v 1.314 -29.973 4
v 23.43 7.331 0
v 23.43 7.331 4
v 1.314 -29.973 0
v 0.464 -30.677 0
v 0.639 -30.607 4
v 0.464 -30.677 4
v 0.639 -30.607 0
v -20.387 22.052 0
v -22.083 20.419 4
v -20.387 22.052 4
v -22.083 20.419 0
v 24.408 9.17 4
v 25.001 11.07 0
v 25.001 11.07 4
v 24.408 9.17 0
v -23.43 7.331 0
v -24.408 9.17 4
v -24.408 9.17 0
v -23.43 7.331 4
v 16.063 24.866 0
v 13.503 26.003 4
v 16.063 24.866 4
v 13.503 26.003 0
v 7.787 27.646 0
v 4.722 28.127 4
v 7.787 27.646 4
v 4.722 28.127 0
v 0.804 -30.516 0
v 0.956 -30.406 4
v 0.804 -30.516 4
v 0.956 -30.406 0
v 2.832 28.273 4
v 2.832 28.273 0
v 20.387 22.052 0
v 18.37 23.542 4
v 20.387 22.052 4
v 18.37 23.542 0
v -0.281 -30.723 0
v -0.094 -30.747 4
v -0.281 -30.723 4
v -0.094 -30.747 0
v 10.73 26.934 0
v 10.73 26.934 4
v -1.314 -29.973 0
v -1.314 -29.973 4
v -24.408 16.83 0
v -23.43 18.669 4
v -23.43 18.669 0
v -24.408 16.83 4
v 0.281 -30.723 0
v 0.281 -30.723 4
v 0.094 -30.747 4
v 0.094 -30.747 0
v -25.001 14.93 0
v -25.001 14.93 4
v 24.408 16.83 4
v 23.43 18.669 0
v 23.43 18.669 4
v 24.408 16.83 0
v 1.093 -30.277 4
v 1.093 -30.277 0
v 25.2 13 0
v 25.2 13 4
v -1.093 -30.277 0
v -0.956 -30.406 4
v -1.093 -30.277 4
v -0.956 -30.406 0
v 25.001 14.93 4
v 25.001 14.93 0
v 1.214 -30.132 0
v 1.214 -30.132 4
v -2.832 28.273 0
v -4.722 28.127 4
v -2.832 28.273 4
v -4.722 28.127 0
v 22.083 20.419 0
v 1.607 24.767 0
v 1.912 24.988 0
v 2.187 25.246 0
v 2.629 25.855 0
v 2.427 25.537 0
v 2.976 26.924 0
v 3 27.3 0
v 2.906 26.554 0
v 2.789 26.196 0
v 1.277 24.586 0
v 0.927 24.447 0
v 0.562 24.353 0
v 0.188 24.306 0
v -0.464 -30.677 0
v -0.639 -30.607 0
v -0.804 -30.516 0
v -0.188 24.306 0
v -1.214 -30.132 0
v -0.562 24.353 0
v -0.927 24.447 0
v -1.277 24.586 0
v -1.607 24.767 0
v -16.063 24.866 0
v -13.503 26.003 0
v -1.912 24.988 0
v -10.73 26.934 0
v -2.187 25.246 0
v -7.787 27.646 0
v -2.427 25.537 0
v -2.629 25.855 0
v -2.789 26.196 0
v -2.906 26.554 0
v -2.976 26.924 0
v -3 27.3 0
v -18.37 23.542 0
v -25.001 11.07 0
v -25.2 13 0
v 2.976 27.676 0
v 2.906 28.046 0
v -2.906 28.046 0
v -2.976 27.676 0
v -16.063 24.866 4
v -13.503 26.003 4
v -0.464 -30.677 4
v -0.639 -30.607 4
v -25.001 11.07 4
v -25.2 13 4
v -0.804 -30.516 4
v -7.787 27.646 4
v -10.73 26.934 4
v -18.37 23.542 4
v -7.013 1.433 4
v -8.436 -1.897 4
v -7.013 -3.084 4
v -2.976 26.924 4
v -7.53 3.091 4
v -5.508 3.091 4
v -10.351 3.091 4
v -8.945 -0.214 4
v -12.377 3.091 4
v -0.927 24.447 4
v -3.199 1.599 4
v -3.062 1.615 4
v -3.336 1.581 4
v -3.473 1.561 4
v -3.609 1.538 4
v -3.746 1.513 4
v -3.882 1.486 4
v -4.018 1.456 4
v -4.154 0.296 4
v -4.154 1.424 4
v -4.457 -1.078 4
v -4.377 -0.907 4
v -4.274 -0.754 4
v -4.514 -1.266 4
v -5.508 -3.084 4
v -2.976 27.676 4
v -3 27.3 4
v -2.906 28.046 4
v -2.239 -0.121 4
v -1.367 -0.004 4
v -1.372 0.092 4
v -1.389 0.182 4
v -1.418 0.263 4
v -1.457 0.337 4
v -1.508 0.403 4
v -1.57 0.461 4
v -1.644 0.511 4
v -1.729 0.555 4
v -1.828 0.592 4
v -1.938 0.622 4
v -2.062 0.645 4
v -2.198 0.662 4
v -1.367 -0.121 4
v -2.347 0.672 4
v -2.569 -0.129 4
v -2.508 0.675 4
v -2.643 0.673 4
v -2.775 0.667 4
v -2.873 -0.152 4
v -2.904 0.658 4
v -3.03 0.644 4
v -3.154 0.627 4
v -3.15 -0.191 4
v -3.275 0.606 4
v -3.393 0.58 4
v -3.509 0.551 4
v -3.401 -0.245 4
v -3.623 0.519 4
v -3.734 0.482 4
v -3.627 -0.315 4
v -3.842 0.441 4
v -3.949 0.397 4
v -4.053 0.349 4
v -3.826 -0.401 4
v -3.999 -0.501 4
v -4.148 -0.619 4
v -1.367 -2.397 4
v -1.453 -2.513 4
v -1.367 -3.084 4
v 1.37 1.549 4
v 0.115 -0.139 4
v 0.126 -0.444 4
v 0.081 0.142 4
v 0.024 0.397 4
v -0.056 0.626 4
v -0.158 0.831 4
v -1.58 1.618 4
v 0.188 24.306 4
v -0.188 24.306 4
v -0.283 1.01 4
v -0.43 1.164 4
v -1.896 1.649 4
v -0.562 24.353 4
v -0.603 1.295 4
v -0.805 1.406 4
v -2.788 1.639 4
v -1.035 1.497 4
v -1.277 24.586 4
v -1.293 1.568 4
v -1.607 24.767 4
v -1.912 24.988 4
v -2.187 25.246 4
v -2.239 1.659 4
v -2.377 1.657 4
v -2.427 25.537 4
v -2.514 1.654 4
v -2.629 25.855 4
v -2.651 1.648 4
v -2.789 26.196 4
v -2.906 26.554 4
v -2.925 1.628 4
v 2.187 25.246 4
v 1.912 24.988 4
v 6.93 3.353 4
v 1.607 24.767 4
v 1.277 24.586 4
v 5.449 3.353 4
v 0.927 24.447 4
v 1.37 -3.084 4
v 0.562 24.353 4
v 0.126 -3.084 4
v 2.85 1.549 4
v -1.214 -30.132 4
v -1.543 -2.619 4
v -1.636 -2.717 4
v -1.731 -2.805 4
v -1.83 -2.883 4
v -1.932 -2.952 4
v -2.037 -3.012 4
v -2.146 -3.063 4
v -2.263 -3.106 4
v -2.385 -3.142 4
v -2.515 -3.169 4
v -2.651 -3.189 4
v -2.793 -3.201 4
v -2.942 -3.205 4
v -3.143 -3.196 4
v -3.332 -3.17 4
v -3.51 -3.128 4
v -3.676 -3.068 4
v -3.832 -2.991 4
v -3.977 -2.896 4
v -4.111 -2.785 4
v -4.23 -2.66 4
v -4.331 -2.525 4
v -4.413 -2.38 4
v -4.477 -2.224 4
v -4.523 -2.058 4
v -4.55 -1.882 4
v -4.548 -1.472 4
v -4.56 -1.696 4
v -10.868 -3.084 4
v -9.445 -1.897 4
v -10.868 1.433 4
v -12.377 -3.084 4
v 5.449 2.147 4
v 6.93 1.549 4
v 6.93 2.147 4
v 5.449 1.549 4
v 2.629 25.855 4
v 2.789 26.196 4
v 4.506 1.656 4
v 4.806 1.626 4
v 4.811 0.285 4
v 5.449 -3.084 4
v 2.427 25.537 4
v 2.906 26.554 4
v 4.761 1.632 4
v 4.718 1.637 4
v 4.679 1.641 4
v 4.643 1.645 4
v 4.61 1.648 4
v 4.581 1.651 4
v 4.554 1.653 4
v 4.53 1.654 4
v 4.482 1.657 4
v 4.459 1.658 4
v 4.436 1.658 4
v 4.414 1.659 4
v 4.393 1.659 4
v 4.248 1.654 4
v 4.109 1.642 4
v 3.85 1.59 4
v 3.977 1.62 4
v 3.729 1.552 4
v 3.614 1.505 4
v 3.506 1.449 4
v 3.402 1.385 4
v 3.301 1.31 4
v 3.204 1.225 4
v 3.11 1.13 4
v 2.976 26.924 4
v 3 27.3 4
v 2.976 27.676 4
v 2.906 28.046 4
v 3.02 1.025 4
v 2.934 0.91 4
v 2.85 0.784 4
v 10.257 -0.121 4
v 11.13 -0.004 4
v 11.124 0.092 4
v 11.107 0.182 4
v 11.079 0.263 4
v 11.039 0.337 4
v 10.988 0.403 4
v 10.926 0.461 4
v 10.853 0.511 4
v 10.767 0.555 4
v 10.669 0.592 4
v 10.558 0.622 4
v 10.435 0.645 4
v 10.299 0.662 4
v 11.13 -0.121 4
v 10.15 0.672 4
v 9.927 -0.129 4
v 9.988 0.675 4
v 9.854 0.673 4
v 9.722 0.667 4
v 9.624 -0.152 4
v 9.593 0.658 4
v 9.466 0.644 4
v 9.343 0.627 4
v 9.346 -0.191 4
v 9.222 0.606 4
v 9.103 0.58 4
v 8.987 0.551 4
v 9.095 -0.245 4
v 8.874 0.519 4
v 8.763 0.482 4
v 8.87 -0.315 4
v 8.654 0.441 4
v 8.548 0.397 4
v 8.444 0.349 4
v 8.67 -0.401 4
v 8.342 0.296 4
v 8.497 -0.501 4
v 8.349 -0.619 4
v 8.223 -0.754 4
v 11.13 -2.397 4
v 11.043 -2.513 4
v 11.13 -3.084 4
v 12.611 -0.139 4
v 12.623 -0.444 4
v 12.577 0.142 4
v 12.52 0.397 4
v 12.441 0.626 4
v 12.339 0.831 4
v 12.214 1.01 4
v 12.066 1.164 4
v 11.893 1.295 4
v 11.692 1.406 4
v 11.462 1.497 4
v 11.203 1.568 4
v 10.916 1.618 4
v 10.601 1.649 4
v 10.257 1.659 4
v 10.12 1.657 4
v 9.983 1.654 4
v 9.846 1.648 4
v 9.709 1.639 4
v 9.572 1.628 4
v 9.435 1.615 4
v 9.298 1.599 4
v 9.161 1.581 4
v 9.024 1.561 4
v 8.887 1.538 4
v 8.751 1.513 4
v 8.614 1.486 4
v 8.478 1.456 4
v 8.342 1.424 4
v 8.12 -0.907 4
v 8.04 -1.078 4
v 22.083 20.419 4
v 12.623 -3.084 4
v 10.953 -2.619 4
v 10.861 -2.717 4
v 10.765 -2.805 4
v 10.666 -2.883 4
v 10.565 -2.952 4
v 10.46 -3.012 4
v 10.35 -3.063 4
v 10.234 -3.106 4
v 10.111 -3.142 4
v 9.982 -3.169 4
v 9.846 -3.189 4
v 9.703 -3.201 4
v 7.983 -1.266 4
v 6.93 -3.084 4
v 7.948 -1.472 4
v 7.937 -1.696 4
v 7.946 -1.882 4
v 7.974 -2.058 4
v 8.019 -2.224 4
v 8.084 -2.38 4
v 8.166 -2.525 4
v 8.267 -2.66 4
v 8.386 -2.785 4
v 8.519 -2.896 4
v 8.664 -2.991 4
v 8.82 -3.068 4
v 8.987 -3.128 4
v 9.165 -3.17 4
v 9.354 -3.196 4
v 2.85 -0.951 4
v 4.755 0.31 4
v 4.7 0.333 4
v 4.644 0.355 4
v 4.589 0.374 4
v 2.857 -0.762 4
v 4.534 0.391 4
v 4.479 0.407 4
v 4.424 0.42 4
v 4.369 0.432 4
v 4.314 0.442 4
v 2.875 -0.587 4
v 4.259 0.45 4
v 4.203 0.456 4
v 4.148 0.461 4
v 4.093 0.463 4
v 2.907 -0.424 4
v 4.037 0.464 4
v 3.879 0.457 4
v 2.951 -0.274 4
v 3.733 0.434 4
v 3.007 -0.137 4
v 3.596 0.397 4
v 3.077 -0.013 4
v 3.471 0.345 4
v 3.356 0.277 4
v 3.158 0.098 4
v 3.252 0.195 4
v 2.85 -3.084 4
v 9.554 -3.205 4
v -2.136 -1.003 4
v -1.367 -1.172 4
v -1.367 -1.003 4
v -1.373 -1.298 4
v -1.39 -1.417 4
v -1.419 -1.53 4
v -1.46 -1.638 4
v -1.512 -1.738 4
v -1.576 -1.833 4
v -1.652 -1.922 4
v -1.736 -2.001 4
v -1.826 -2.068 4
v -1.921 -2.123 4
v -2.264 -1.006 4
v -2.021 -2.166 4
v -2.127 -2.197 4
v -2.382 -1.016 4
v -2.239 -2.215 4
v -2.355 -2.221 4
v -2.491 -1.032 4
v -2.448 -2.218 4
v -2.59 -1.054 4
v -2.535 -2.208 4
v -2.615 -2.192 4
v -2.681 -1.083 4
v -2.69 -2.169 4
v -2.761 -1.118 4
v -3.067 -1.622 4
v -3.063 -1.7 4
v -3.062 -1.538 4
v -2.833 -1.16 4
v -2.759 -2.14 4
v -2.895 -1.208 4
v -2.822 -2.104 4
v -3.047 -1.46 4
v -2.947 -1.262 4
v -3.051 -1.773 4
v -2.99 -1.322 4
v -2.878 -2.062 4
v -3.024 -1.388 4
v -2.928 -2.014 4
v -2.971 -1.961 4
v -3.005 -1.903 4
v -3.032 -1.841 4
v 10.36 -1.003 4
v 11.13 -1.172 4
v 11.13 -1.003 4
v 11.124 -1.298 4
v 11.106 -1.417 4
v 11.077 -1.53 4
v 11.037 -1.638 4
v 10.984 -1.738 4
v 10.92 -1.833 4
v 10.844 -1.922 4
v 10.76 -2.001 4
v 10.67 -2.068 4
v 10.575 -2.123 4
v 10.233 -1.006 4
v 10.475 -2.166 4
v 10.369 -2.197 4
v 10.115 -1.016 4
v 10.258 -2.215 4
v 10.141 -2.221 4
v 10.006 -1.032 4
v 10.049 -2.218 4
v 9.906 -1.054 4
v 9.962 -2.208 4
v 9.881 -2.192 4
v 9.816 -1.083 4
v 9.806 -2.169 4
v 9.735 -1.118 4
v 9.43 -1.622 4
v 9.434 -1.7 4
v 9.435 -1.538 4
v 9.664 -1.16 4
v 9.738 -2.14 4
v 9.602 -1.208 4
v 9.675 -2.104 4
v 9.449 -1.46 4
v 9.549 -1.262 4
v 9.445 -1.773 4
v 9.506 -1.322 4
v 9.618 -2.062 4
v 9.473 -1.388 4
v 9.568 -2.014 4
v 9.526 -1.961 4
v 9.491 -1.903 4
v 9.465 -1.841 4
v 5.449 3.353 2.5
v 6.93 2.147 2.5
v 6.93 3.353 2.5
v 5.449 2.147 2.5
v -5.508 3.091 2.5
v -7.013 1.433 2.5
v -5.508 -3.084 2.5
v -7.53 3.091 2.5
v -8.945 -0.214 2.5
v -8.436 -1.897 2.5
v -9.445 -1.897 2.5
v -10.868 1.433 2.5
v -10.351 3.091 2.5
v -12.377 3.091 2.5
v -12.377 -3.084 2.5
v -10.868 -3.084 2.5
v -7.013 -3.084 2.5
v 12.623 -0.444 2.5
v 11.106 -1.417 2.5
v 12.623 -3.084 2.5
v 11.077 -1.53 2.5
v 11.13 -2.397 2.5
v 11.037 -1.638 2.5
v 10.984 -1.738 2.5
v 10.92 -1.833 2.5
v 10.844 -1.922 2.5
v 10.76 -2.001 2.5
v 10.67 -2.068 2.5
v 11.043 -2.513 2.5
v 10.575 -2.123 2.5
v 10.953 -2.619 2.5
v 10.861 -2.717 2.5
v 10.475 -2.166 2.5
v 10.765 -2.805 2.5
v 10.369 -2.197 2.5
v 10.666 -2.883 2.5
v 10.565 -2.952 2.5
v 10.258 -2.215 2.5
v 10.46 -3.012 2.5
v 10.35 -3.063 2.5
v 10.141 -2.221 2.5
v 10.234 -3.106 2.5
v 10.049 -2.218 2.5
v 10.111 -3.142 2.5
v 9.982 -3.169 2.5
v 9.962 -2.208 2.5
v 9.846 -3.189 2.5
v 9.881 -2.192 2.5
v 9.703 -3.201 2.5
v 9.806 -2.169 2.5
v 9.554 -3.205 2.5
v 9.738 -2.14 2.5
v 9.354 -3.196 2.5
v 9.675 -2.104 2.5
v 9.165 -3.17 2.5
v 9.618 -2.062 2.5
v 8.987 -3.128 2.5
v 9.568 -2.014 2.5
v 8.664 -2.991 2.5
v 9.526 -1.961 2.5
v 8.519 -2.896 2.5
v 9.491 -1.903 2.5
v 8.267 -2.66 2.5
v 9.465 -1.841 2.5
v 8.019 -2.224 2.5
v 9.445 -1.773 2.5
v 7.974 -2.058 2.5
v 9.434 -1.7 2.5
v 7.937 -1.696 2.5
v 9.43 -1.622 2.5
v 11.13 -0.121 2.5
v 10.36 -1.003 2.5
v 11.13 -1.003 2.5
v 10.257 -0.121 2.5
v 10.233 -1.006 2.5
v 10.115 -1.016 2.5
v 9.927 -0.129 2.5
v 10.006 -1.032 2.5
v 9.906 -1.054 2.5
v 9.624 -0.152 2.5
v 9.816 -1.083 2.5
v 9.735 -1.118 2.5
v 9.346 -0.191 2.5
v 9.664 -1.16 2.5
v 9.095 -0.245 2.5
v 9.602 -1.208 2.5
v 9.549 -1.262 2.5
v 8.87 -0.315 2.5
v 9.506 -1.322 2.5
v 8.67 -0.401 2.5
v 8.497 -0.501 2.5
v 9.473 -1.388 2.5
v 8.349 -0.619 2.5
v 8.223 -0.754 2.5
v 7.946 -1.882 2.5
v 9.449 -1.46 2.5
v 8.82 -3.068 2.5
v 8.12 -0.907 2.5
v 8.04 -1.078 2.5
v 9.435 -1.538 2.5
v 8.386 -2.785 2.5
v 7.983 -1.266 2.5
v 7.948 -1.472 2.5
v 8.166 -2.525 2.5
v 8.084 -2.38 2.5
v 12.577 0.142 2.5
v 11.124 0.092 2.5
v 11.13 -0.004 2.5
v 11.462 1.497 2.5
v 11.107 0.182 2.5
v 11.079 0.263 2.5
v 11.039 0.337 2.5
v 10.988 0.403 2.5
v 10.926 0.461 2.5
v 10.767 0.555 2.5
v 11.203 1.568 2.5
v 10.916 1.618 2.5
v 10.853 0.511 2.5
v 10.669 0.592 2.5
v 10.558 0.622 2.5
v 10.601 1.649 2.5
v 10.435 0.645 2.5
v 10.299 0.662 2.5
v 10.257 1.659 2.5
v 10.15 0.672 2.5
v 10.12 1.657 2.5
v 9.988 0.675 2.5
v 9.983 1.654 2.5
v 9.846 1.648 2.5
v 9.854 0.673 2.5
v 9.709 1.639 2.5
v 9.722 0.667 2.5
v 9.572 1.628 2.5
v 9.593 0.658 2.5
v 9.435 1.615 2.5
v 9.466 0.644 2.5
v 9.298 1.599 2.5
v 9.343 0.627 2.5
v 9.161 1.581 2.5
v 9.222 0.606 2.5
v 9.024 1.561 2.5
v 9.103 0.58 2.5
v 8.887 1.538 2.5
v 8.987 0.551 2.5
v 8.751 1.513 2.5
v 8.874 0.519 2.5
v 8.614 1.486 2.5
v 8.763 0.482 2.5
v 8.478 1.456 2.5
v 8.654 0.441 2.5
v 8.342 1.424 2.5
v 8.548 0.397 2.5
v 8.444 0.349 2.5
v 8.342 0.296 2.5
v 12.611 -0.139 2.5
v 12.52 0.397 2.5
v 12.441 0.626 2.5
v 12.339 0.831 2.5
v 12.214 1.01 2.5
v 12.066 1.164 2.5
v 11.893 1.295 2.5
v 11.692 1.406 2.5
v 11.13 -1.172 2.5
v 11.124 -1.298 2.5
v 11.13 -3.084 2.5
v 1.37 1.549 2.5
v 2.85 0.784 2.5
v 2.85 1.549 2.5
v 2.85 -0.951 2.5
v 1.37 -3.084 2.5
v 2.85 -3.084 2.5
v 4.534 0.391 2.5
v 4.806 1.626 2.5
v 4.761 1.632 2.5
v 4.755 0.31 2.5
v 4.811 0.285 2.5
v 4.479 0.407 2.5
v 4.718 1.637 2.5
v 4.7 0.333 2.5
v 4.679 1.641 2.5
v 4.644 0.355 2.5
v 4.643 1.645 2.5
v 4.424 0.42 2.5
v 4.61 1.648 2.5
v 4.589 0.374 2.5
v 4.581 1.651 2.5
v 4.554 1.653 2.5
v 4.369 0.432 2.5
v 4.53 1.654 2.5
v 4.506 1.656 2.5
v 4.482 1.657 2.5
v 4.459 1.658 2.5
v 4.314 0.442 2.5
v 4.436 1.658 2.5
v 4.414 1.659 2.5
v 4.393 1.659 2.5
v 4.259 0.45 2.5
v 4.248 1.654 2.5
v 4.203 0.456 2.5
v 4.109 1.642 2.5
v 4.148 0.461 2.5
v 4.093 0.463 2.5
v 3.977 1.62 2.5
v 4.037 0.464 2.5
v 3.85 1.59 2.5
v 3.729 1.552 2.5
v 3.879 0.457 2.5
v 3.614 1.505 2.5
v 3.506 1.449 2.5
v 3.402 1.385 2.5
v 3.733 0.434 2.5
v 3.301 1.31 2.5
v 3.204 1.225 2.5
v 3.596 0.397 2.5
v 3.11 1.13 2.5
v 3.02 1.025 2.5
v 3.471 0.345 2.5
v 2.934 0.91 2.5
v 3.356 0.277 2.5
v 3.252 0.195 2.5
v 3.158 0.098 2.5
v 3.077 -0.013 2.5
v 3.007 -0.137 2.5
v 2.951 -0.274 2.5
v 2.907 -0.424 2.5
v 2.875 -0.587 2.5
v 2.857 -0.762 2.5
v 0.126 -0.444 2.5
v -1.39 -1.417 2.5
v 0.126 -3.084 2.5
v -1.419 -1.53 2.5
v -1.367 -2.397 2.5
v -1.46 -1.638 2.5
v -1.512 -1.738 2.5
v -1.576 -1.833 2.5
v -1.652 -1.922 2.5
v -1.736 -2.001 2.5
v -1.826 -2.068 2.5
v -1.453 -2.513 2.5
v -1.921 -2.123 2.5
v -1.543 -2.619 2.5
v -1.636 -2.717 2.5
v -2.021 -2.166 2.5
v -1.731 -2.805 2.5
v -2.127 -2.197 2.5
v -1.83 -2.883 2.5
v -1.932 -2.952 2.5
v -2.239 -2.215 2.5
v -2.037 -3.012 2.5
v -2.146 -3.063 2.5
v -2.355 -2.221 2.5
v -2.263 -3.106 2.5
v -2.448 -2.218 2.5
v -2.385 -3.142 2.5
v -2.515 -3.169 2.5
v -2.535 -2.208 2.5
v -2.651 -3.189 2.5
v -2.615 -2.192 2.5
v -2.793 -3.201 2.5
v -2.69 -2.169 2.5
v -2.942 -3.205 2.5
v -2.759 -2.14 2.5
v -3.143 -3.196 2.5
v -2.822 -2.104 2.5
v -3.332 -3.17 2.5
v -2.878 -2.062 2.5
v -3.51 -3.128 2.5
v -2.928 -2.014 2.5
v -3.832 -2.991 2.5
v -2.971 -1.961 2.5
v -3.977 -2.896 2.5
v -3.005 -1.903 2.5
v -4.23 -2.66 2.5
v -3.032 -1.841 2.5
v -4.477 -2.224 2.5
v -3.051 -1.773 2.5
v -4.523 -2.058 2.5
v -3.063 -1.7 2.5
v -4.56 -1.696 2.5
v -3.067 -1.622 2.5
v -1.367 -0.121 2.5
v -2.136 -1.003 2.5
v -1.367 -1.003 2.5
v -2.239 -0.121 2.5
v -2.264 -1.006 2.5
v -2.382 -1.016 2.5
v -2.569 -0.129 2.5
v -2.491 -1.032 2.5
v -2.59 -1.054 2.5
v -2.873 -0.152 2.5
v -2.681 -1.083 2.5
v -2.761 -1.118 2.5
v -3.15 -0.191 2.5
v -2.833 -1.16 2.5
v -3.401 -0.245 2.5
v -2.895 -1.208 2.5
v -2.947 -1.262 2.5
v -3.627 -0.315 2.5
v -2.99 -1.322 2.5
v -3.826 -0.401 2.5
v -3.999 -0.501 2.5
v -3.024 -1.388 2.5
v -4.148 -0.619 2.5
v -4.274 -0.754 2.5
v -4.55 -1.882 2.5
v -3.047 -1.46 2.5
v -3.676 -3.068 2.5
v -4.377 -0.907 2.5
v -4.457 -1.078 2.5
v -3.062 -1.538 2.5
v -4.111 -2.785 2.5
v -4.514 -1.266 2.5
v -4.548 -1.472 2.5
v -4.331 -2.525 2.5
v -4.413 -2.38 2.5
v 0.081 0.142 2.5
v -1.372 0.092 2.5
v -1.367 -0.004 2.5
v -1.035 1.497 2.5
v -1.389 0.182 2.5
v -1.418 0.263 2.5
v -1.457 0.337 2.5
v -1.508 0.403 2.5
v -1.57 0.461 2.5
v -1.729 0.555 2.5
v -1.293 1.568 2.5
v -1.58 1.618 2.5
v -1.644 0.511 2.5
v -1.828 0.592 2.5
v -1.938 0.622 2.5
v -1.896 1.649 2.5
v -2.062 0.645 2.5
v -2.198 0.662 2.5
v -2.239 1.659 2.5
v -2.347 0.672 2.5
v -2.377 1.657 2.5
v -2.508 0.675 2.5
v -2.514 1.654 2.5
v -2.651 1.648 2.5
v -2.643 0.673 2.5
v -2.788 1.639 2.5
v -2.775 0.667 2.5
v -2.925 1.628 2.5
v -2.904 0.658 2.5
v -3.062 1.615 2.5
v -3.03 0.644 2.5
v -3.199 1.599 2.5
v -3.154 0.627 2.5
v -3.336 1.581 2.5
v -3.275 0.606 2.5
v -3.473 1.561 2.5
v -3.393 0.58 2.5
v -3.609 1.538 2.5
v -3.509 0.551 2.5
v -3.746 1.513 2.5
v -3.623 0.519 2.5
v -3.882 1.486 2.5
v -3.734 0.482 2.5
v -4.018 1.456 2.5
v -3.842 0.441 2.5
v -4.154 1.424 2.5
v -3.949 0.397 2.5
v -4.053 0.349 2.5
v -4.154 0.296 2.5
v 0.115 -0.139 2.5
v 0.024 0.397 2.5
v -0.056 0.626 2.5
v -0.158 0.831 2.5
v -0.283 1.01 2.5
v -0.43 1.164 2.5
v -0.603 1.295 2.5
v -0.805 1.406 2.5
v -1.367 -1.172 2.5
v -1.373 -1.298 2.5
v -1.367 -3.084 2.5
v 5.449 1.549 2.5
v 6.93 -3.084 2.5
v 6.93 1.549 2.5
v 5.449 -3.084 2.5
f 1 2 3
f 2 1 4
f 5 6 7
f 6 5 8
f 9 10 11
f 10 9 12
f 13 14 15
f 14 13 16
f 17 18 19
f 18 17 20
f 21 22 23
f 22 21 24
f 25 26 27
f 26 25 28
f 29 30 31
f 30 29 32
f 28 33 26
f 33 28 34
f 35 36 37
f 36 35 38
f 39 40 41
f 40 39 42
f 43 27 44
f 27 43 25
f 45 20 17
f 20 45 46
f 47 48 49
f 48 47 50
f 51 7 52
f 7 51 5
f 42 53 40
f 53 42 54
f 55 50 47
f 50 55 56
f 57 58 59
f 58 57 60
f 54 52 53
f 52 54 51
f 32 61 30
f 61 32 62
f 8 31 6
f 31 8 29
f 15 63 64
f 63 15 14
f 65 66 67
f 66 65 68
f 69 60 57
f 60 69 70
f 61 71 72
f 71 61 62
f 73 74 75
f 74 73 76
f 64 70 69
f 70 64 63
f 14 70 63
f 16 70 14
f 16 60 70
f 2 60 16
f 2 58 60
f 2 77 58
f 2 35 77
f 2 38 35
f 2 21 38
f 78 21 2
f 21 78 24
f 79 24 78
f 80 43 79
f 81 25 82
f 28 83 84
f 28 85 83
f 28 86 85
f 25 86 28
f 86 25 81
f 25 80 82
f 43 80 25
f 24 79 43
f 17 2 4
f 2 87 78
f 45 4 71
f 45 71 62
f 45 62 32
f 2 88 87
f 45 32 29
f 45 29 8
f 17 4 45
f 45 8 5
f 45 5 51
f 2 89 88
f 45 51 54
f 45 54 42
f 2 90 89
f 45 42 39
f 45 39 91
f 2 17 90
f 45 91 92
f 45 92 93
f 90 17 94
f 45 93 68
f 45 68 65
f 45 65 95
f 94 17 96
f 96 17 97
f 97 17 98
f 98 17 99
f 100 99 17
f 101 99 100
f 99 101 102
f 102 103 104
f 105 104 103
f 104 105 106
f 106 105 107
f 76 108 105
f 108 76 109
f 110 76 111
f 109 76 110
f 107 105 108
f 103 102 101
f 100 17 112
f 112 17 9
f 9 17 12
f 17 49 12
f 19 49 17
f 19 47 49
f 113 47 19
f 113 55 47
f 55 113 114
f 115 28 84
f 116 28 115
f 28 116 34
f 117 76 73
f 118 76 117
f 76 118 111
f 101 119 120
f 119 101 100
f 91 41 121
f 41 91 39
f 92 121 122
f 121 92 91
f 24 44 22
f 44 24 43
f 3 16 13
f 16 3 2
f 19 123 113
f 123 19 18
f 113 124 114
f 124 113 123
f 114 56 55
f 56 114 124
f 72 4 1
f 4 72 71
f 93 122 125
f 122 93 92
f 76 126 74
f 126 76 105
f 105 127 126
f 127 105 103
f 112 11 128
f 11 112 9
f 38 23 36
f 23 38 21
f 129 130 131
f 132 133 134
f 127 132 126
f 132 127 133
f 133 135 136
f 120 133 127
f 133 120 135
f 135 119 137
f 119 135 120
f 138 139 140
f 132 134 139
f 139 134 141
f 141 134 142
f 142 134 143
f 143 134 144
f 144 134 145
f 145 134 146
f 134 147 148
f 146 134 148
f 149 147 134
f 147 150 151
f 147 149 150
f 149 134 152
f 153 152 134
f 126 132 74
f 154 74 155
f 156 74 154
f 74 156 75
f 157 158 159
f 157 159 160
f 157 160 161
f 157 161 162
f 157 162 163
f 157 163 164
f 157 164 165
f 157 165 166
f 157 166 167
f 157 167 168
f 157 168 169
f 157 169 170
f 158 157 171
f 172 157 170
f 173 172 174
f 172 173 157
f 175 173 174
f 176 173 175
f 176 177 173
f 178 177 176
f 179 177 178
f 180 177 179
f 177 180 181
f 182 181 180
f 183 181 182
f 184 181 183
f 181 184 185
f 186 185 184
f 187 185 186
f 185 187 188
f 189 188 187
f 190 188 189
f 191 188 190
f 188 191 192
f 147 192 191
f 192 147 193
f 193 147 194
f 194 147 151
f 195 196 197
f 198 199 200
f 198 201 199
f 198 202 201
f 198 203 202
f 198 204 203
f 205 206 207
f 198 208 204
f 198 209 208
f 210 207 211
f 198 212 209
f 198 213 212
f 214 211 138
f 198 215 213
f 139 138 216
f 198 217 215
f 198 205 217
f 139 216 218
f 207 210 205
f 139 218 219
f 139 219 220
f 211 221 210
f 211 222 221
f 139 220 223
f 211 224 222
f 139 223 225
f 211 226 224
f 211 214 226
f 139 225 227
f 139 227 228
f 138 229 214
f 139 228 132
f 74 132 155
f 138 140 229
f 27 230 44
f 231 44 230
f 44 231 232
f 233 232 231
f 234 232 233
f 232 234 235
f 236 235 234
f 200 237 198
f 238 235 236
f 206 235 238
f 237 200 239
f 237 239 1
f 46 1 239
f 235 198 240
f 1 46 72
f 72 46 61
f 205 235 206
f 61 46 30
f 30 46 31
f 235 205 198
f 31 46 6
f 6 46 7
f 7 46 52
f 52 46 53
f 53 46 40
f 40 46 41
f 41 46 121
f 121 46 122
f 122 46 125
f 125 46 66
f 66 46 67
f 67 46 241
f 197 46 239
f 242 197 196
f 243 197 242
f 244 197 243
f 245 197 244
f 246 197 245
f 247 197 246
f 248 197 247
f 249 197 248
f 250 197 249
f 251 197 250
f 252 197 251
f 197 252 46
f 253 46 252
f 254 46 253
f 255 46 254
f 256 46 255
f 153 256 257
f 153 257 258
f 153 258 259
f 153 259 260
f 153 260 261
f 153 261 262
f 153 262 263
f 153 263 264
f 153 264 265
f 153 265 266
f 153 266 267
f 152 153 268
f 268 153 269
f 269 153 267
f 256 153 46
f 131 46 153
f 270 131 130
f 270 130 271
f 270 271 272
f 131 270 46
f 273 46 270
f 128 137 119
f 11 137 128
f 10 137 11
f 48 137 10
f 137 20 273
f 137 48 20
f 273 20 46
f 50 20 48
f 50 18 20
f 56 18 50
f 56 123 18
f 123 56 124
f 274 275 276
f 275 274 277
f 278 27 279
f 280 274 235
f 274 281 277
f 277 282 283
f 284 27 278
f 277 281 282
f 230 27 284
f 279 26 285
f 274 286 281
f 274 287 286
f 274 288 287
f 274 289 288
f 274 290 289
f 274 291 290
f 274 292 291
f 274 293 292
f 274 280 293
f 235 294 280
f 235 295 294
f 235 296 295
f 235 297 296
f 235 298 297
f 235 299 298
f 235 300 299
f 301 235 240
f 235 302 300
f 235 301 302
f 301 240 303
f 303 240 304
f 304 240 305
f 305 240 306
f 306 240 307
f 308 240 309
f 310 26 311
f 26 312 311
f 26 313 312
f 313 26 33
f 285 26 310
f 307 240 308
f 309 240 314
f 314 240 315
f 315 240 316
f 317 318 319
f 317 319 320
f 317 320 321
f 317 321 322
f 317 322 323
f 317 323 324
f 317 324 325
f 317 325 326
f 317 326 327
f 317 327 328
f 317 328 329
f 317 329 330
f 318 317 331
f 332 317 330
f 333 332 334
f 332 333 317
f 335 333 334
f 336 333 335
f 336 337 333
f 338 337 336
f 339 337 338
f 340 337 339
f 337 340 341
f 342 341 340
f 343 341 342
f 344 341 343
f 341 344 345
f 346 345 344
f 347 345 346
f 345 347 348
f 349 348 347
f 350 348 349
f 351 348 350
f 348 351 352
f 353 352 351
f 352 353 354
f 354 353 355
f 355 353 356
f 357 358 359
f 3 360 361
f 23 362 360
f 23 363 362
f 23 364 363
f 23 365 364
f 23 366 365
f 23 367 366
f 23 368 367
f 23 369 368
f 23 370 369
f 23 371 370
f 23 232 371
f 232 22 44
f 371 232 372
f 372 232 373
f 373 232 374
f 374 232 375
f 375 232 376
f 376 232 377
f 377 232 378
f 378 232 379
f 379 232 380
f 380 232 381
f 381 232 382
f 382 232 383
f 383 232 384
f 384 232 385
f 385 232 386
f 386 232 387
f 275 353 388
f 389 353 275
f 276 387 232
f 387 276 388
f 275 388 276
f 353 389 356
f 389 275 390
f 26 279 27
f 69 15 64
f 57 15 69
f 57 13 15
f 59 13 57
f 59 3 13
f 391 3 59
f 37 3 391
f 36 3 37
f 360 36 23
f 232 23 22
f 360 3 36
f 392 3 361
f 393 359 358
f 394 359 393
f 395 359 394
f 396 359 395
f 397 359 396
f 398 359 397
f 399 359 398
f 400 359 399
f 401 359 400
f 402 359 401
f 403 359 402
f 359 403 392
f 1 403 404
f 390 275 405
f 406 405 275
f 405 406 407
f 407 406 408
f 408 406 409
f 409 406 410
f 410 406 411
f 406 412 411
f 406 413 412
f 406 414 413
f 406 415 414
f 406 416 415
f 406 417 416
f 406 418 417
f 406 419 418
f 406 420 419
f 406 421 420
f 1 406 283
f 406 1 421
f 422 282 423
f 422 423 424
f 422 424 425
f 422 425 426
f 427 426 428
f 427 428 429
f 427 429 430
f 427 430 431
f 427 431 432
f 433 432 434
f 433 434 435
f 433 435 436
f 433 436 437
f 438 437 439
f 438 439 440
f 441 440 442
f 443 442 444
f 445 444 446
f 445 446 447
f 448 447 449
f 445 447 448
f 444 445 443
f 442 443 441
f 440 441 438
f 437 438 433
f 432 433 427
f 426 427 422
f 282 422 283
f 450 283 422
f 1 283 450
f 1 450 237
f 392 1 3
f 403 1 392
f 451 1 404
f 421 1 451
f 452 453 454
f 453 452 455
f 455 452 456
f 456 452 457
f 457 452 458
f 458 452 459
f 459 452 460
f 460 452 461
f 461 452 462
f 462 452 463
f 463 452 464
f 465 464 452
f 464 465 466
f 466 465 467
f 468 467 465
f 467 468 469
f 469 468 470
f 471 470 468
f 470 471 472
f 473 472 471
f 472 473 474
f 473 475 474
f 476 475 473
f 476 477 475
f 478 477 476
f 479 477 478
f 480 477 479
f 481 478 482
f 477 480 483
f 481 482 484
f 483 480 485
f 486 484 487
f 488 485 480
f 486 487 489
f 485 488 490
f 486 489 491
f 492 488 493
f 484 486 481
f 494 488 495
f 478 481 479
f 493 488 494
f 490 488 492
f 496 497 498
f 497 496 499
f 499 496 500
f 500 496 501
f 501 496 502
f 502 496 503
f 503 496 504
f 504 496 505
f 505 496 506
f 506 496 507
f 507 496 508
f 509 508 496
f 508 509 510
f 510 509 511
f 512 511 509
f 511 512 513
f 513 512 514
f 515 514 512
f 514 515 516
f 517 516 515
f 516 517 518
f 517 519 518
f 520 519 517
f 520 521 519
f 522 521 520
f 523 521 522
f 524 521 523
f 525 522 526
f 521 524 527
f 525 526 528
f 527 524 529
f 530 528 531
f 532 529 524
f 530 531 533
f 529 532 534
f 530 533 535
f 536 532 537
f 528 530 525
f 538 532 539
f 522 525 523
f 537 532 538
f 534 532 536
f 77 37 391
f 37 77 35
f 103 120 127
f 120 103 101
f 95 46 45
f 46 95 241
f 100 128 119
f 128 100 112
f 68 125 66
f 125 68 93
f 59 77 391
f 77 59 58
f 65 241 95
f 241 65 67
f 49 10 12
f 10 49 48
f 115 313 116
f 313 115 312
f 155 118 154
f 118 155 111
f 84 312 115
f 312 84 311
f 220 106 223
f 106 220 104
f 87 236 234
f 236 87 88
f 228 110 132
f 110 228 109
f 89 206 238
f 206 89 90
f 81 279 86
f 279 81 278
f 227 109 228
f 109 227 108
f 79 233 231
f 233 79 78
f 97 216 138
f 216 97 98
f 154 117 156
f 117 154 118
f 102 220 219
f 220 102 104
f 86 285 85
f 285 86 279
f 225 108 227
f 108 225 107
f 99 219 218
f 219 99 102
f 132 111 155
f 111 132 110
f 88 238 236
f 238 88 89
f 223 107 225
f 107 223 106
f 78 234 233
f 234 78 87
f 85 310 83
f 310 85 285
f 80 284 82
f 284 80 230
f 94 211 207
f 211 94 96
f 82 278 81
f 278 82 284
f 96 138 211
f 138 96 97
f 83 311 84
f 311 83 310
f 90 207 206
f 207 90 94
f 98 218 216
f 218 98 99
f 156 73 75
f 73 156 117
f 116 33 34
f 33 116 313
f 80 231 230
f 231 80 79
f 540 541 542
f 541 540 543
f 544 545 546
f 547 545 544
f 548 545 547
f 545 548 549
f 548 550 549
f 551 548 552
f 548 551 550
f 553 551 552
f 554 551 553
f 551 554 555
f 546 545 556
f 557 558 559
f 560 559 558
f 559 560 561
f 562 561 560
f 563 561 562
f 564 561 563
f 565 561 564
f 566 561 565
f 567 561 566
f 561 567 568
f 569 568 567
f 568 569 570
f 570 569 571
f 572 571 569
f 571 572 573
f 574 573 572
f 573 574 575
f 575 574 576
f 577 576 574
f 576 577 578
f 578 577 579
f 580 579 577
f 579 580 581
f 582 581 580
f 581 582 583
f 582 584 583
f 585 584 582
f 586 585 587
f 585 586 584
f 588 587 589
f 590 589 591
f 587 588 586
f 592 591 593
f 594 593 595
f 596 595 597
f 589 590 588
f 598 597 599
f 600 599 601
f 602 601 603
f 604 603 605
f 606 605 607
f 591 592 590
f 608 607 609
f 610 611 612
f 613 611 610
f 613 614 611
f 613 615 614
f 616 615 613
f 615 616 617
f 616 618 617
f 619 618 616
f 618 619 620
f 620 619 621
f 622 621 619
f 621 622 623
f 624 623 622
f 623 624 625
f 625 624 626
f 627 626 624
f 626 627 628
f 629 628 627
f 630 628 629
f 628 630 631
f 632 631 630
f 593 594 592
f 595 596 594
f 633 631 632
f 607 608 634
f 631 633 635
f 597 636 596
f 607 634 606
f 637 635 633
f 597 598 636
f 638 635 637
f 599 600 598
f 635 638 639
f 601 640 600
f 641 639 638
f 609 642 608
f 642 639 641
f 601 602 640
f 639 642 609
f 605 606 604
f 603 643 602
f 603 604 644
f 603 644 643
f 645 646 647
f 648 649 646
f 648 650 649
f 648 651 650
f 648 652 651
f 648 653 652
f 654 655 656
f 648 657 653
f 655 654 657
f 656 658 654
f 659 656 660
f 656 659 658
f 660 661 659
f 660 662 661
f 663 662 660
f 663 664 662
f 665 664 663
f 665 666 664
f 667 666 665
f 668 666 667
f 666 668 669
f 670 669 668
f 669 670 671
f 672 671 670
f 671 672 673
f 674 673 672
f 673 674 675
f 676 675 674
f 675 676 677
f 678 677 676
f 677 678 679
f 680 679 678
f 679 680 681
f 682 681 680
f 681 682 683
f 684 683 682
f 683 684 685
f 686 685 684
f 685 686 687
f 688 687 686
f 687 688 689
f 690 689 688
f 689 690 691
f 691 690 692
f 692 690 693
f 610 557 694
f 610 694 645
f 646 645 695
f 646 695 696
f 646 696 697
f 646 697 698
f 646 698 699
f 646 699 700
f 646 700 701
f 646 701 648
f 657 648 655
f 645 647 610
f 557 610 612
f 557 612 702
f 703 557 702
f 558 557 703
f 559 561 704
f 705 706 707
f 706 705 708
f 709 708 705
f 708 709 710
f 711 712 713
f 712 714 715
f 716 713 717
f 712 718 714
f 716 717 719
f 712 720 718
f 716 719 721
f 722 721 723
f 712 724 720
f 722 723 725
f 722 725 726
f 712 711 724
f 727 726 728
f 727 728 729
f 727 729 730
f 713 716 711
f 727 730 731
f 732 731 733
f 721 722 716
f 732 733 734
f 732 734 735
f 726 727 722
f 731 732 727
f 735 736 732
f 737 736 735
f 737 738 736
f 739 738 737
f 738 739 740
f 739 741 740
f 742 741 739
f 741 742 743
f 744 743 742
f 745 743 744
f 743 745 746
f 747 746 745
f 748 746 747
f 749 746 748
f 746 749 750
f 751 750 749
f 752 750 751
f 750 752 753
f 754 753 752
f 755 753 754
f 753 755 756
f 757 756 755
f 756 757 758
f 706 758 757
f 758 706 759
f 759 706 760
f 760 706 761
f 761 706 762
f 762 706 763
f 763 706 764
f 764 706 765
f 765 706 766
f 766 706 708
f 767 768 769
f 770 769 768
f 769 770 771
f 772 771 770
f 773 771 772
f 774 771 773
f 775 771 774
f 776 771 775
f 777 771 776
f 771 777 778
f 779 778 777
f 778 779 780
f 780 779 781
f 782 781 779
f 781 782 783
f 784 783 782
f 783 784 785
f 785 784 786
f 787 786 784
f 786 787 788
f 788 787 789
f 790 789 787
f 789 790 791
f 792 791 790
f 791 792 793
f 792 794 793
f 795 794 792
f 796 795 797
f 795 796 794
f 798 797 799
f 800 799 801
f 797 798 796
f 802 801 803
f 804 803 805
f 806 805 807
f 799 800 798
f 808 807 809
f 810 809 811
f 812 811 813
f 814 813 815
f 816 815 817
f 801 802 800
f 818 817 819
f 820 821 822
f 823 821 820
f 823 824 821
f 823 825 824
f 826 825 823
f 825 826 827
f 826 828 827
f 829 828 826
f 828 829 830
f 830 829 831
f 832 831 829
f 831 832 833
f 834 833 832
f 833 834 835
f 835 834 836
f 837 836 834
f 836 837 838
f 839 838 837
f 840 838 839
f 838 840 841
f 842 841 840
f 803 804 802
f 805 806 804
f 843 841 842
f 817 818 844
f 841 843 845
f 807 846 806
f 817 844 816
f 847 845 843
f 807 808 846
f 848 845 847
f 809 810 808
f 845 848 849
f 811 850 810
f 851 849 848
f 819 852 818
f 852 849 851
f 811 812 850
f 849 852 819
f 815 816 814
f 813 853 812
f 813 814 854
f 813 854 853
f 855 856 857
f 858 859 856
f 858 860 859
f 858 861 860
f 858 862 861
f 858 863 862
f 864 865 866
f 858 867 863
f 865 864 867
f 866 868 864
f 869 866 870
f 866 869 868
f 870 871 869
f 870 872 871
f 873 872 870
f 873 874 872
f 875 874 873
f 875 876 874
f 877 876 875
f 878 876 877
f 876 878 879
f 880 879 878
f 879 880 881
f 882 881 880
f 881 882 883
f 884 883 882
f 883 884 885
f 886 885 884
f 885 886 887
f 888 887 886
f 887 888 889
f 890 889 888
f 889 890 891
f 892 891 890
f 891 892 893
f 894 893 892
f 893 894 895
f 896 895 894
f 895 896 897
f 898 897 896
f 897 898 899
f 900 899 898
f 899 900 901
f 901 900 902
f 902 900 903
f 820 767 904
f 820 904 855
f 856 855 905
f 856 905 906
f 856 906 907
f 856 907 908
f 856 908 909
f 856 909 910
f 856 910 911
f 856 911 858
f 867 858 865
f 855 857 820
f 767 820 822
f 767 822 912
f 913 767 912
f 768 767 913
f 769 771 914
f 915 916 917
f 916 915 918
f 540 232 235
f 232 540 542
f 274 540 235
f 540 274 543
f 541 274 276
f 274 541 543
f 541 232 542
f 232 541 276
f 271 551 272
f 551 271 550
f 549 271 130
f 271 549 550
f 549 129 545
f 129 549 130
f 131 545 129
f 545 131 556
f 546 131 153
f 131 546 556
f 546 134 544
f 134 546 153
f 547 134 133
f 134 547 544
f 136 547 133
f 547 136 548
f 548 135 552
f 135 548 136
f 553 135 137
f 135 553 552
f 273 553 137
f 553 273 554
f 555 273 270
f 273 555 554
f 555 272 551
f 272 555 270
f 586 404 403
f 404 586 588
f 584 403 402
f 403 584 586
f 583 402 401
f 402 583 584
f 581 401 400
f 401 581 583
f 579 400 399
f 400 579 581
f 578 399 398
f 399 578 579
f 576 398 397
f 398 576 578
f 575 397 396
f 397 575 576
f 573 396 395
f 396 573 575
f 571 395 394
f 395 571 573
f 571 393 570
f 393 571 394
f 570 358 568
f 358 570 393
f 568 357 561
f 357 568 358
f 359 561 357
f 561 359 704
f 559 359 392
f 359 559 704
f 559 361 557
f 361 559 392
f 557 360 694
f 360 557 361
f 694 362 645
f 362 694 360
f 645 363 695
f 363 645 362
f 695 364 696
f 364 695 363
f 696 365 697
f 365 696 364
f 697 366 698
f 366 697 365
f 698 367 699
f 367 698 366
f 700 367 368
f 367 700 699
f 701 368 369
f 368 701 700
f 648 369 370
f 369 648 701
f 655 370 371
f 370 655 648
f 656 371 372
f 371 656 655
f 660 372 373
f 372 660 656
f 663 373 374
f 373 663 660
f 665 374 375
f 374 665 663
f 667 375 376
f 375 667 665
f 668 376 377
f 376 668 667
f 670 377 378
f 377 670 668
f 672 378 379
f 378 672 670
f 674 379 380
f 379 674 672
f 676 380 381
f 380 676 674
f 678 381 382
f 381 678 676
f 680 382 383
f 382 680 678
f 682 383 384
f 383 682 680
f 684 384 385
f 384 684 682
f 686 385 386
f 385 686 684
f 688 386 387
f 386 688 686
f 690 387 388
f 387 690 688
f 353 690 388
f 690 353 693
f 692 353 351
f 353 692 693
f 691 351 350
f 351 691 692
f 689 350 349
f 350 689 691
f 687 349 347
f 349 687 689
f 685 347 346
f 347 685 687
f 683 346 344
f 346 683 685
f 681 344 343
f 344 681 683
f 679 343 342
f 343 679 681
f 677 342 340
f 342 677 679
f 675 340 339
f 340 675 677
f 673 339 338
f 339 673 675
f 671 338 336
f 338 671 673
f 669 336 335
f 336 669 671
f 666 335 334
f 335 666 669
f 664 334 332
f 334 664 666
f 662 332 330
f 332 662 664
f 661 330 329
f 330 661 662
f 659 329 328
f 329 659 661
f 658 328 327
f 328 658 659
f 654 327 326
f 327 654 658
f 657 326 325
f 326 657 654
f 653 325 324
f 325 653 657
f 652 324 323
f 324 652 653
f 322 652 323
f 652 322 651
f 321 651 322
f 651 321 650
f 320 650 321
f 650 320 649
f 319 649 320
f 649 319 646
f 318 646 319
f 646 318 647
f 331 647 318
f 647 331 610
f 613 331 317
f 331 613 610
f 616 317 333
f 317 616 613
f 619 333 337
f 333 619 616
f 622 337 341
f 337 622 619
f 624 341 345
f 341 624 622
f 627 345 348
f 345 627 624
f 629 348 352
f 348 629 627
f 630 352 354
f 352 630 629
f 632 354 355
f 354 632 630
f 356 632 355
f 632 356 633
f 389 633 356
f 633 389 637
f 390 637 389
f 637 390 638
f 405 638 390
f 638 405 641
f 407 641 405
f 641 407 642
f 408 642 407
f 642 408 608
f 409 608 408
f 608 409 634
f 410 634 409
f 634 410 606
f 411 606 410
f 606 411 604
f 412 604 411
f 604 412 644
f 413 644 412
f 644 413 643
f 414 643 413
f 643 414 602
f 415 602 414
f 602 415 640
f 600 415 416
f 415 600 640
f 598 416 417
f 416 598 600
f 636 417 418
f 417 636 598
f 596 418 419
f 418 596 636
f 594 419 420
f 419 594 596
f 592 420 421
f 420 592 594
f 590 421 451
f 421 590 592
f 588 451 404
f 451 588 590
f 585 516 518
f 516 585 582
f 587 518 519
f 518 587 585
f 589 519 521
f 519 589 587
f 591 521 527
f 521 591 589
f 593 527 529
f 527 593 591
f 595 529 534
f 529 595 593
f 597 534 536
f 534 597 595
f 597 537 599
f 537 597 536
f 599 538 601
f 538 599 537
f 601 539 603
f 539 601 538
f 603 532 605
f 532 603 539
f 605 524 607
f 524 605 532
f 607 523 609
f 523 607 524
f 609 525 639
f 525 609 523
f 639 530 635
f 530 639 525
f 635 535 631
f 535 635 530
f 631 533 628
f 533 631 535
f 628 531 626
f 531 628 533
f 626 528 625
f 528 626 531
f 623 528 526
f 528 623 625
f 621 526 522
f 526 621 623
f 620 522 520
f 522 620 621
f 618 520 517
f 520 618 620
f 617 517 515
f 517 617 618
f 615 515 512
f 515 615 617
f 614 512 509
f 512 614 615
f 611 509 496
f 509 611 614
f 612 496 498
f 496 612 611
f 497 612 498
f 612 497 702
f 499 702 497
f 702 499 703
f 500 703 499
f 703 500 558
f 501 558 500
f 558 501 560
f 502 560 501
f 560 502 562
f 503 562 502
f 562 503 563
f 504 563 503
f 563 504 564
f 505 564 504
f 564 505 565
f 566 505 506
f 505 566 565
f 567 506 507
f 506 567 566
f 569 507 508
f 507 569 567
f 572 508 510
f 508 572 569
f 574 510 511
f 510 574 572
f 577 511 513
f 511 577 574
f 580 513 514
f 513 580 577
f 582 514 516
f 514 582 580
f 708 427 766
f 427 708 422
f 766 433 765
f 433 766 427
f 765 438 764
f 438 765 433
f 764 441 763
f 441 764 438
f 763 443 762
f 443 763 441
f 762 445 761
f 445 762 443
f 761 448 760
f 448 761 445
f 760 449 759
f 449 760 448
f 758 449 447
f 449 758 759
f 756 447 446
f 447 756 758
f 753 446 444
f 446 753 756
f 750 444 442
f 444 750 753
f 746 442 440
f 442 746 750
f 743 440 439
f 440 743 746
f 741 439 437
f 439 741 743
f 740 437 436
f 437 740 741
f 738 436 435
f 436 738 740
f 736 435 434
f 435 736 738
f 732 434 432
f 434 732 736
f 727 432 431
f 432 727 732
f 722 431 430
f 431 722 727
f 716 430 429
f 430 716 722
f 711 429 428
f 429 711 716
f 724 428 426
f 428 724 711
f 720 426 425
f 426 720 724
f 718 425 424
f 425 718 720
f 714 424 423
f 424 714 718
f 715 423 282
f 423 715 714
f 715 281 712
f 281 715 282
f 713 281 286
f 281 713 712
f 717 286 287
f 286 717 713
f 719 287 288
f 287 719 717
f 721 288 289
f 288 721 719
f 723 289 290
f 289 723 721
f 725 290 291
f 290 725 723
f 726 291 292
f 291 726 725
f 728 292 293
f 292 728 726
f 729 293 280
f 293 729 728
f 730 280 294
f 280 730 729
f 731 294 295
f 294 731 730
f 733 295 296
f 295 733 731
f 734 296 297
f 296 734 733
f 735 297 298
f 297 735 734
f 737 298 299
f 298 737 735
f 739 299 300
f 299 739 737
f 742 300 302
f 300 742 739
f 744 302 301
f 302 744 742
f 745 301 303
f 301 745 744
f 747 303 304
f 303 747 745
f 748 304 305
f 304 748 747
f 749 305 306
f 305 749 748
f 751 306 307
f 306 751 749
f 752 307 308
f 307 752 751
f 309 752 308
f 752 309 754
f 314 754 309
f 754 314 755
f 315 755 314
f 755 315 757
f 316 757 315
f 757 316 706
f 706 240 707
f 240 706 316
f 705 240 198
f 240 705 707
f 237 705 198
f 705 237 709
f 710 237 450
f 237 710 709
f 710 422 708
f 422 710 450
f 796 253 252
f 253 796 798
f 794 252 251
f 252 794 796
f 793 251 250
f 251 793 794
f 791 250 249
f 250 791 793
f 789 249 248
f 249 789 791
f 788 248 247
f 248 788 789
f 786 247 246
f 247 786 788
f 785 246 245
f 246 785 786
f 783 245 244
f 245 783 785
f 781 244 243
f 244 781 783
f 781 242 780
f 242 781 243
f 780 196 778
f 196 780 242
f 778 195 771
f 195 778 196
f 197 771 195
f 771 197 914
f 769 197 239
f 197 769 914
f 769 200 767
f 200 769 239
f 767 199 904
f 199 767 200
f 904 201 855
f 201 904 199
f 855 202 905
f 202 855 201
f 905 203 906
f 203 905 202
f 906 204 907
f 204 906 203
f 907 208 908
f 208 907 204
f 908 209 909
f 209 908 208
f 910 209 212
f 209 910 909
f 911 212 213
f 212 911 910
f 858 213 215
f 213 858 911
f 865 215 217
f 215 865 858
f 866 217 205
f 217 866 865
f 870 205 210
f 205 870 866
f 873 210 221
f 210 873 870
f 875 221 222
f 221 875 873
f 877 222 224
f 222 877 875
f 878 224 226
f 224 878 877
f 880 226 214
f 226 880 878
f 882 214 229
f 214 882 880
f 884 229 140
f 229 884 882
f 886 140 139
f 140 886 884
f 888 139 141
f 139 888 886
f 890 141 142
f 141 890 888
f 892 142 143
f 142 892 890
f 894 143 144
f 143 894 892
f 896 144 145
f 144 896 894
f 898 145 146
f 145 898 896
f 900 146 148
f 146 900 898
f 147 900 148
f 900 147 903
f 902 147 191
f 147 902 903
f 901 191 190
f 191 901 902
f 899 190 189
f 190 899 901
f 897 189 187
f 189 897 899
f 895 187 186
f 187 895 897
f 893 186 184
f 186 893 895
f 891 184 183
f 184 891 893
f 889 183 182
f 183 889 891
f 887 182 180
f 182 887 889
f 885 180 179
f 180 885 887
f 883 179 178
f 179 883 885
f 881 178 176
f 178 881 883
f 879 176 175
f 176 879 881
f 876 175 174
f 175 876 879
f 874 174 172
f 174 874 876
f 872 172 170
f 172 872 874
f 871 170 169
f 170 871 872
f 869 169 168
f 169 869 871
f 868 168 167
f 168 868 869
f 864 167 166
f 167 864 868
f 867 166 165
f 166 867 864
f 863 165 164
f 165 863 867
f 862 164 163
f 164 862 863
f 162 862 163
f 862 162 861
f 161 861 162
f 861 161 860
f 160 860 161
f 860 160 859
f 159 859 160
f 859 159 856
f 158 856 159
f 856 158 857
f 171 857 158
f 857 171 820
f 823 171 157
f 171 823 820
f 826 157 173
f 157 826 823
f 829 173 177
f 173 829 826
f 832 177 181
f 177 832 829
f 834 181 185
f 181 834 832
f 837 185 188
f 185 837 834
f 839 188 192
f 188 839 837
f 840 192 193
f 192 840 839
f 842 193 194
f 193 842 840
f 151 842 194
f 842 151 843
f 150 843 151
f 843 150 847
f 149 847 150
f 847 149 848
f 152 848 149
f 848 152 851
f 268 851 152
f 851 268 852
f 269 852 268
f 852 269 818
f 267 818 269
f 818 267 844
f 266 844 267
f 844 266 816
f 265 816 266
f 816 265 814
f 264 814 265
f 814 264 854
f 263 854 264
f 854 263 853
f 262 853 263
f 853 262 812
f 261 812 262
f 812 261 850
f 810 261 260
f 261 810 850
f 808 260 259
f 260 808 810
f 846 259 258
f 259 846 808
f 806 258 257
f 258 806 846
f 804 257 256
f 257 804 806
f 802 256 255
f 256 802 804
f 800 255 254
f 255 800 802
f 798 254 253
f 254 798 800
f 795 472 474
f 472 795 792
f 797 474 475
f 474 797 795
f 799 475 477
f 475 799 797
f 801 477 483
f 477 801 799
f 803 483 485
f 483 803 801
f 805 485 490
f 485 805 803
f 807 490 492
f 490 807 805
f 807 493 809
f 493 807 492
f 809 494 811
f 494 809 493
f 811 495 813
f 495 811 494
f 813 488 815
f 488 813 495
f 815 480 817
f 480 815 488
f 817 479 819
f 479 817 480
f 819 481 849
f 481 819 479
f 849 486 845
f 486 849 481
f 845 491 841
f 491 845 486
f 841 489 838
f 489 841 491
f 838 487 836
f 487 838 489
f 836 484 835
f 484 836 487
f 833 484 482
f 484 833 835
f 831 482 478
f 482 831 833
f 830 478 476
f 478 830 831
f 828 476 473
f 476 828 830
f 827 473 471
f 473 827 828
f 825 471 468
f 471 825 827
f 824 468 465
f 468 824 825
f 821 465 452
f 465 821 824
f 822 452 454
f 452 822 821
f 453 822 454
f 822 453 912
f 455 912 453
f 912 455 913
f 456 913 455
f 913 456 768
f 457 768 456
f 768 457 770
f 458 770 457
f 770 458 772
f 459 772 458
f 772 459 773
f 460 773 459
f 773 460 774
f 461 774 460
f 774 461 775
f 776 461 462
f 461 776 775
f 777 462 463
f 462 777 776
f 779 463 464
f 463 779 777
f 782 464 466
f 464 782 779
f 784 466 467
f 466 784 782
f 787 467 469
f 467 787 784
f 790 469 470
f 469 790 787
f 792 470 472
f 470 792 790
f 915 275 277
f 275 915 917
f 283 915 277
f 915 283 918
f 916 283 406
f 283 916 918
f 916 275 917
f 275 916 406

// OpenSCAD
// Carrot Name Keychain
// Carrot-shaped keychain with personalized name

// --- Parameters ---
Name          = "Maria";
Font          = "Bebas Neue";
Name_Size     = 25;
Carrot_Width  = 28;
Carrot_Height = 65;
Thickness     = 4;
Ring_Hole_D   = 6;
Text_Depth    = 1.5;

$fn = 50;

module name_shape(txt, fnt) {
  resize([Name_Size, 0, 0], auto=true)
  text(txt, size=10, font=fnt, halign="center", valign="center");
}

module carrot_body_2d(w, h) {
  // Tapered body: wide at top, pointed at bottom
  hull() {
    translate([0, h * 0.2])
    ellipse(w * 0.9, w * 0.55);
    translate([0, -h * 0.45])
    circle(r=1.5);
  }
}

module ellipse(rx, ry) {
  scale([rx, ry]) circle(1);
}

module leaf_2d(w, h) {
  // Three leaves at top
  for (a = [-20, 0, 20]) {
    rotate([0, 0, a])
    translate([0, h * 0.08])
    scale([0.35, 1])
    circle(r=h * 0.2);
  }
}

module carrot_2d(w, h) {
  union() {
    carrot_body_2d(w, h);
    leaf_2d(w, h);
  }
}

module ring_hole_pos() {
  translate([0, Carrot_Height * 0.42])
  children();
}

difference() {
  linear_extrude(Thickness)
  carrot_2d(Carrot_Width, Carrot_Height);

  // Ring hole
  ring_hole_pos()
  translate([0, 0, -0.5])
  linear_extrude(Thickness + 1)
  circle(d=Ring_Hole_D);

  // Engraved name
  translate([0, 0, Thickness - Text_Depth])
  linear_extrude(Text_Depth + 0.5)
  name_shape(Name, str(Font, ":style=Bold"));
}
